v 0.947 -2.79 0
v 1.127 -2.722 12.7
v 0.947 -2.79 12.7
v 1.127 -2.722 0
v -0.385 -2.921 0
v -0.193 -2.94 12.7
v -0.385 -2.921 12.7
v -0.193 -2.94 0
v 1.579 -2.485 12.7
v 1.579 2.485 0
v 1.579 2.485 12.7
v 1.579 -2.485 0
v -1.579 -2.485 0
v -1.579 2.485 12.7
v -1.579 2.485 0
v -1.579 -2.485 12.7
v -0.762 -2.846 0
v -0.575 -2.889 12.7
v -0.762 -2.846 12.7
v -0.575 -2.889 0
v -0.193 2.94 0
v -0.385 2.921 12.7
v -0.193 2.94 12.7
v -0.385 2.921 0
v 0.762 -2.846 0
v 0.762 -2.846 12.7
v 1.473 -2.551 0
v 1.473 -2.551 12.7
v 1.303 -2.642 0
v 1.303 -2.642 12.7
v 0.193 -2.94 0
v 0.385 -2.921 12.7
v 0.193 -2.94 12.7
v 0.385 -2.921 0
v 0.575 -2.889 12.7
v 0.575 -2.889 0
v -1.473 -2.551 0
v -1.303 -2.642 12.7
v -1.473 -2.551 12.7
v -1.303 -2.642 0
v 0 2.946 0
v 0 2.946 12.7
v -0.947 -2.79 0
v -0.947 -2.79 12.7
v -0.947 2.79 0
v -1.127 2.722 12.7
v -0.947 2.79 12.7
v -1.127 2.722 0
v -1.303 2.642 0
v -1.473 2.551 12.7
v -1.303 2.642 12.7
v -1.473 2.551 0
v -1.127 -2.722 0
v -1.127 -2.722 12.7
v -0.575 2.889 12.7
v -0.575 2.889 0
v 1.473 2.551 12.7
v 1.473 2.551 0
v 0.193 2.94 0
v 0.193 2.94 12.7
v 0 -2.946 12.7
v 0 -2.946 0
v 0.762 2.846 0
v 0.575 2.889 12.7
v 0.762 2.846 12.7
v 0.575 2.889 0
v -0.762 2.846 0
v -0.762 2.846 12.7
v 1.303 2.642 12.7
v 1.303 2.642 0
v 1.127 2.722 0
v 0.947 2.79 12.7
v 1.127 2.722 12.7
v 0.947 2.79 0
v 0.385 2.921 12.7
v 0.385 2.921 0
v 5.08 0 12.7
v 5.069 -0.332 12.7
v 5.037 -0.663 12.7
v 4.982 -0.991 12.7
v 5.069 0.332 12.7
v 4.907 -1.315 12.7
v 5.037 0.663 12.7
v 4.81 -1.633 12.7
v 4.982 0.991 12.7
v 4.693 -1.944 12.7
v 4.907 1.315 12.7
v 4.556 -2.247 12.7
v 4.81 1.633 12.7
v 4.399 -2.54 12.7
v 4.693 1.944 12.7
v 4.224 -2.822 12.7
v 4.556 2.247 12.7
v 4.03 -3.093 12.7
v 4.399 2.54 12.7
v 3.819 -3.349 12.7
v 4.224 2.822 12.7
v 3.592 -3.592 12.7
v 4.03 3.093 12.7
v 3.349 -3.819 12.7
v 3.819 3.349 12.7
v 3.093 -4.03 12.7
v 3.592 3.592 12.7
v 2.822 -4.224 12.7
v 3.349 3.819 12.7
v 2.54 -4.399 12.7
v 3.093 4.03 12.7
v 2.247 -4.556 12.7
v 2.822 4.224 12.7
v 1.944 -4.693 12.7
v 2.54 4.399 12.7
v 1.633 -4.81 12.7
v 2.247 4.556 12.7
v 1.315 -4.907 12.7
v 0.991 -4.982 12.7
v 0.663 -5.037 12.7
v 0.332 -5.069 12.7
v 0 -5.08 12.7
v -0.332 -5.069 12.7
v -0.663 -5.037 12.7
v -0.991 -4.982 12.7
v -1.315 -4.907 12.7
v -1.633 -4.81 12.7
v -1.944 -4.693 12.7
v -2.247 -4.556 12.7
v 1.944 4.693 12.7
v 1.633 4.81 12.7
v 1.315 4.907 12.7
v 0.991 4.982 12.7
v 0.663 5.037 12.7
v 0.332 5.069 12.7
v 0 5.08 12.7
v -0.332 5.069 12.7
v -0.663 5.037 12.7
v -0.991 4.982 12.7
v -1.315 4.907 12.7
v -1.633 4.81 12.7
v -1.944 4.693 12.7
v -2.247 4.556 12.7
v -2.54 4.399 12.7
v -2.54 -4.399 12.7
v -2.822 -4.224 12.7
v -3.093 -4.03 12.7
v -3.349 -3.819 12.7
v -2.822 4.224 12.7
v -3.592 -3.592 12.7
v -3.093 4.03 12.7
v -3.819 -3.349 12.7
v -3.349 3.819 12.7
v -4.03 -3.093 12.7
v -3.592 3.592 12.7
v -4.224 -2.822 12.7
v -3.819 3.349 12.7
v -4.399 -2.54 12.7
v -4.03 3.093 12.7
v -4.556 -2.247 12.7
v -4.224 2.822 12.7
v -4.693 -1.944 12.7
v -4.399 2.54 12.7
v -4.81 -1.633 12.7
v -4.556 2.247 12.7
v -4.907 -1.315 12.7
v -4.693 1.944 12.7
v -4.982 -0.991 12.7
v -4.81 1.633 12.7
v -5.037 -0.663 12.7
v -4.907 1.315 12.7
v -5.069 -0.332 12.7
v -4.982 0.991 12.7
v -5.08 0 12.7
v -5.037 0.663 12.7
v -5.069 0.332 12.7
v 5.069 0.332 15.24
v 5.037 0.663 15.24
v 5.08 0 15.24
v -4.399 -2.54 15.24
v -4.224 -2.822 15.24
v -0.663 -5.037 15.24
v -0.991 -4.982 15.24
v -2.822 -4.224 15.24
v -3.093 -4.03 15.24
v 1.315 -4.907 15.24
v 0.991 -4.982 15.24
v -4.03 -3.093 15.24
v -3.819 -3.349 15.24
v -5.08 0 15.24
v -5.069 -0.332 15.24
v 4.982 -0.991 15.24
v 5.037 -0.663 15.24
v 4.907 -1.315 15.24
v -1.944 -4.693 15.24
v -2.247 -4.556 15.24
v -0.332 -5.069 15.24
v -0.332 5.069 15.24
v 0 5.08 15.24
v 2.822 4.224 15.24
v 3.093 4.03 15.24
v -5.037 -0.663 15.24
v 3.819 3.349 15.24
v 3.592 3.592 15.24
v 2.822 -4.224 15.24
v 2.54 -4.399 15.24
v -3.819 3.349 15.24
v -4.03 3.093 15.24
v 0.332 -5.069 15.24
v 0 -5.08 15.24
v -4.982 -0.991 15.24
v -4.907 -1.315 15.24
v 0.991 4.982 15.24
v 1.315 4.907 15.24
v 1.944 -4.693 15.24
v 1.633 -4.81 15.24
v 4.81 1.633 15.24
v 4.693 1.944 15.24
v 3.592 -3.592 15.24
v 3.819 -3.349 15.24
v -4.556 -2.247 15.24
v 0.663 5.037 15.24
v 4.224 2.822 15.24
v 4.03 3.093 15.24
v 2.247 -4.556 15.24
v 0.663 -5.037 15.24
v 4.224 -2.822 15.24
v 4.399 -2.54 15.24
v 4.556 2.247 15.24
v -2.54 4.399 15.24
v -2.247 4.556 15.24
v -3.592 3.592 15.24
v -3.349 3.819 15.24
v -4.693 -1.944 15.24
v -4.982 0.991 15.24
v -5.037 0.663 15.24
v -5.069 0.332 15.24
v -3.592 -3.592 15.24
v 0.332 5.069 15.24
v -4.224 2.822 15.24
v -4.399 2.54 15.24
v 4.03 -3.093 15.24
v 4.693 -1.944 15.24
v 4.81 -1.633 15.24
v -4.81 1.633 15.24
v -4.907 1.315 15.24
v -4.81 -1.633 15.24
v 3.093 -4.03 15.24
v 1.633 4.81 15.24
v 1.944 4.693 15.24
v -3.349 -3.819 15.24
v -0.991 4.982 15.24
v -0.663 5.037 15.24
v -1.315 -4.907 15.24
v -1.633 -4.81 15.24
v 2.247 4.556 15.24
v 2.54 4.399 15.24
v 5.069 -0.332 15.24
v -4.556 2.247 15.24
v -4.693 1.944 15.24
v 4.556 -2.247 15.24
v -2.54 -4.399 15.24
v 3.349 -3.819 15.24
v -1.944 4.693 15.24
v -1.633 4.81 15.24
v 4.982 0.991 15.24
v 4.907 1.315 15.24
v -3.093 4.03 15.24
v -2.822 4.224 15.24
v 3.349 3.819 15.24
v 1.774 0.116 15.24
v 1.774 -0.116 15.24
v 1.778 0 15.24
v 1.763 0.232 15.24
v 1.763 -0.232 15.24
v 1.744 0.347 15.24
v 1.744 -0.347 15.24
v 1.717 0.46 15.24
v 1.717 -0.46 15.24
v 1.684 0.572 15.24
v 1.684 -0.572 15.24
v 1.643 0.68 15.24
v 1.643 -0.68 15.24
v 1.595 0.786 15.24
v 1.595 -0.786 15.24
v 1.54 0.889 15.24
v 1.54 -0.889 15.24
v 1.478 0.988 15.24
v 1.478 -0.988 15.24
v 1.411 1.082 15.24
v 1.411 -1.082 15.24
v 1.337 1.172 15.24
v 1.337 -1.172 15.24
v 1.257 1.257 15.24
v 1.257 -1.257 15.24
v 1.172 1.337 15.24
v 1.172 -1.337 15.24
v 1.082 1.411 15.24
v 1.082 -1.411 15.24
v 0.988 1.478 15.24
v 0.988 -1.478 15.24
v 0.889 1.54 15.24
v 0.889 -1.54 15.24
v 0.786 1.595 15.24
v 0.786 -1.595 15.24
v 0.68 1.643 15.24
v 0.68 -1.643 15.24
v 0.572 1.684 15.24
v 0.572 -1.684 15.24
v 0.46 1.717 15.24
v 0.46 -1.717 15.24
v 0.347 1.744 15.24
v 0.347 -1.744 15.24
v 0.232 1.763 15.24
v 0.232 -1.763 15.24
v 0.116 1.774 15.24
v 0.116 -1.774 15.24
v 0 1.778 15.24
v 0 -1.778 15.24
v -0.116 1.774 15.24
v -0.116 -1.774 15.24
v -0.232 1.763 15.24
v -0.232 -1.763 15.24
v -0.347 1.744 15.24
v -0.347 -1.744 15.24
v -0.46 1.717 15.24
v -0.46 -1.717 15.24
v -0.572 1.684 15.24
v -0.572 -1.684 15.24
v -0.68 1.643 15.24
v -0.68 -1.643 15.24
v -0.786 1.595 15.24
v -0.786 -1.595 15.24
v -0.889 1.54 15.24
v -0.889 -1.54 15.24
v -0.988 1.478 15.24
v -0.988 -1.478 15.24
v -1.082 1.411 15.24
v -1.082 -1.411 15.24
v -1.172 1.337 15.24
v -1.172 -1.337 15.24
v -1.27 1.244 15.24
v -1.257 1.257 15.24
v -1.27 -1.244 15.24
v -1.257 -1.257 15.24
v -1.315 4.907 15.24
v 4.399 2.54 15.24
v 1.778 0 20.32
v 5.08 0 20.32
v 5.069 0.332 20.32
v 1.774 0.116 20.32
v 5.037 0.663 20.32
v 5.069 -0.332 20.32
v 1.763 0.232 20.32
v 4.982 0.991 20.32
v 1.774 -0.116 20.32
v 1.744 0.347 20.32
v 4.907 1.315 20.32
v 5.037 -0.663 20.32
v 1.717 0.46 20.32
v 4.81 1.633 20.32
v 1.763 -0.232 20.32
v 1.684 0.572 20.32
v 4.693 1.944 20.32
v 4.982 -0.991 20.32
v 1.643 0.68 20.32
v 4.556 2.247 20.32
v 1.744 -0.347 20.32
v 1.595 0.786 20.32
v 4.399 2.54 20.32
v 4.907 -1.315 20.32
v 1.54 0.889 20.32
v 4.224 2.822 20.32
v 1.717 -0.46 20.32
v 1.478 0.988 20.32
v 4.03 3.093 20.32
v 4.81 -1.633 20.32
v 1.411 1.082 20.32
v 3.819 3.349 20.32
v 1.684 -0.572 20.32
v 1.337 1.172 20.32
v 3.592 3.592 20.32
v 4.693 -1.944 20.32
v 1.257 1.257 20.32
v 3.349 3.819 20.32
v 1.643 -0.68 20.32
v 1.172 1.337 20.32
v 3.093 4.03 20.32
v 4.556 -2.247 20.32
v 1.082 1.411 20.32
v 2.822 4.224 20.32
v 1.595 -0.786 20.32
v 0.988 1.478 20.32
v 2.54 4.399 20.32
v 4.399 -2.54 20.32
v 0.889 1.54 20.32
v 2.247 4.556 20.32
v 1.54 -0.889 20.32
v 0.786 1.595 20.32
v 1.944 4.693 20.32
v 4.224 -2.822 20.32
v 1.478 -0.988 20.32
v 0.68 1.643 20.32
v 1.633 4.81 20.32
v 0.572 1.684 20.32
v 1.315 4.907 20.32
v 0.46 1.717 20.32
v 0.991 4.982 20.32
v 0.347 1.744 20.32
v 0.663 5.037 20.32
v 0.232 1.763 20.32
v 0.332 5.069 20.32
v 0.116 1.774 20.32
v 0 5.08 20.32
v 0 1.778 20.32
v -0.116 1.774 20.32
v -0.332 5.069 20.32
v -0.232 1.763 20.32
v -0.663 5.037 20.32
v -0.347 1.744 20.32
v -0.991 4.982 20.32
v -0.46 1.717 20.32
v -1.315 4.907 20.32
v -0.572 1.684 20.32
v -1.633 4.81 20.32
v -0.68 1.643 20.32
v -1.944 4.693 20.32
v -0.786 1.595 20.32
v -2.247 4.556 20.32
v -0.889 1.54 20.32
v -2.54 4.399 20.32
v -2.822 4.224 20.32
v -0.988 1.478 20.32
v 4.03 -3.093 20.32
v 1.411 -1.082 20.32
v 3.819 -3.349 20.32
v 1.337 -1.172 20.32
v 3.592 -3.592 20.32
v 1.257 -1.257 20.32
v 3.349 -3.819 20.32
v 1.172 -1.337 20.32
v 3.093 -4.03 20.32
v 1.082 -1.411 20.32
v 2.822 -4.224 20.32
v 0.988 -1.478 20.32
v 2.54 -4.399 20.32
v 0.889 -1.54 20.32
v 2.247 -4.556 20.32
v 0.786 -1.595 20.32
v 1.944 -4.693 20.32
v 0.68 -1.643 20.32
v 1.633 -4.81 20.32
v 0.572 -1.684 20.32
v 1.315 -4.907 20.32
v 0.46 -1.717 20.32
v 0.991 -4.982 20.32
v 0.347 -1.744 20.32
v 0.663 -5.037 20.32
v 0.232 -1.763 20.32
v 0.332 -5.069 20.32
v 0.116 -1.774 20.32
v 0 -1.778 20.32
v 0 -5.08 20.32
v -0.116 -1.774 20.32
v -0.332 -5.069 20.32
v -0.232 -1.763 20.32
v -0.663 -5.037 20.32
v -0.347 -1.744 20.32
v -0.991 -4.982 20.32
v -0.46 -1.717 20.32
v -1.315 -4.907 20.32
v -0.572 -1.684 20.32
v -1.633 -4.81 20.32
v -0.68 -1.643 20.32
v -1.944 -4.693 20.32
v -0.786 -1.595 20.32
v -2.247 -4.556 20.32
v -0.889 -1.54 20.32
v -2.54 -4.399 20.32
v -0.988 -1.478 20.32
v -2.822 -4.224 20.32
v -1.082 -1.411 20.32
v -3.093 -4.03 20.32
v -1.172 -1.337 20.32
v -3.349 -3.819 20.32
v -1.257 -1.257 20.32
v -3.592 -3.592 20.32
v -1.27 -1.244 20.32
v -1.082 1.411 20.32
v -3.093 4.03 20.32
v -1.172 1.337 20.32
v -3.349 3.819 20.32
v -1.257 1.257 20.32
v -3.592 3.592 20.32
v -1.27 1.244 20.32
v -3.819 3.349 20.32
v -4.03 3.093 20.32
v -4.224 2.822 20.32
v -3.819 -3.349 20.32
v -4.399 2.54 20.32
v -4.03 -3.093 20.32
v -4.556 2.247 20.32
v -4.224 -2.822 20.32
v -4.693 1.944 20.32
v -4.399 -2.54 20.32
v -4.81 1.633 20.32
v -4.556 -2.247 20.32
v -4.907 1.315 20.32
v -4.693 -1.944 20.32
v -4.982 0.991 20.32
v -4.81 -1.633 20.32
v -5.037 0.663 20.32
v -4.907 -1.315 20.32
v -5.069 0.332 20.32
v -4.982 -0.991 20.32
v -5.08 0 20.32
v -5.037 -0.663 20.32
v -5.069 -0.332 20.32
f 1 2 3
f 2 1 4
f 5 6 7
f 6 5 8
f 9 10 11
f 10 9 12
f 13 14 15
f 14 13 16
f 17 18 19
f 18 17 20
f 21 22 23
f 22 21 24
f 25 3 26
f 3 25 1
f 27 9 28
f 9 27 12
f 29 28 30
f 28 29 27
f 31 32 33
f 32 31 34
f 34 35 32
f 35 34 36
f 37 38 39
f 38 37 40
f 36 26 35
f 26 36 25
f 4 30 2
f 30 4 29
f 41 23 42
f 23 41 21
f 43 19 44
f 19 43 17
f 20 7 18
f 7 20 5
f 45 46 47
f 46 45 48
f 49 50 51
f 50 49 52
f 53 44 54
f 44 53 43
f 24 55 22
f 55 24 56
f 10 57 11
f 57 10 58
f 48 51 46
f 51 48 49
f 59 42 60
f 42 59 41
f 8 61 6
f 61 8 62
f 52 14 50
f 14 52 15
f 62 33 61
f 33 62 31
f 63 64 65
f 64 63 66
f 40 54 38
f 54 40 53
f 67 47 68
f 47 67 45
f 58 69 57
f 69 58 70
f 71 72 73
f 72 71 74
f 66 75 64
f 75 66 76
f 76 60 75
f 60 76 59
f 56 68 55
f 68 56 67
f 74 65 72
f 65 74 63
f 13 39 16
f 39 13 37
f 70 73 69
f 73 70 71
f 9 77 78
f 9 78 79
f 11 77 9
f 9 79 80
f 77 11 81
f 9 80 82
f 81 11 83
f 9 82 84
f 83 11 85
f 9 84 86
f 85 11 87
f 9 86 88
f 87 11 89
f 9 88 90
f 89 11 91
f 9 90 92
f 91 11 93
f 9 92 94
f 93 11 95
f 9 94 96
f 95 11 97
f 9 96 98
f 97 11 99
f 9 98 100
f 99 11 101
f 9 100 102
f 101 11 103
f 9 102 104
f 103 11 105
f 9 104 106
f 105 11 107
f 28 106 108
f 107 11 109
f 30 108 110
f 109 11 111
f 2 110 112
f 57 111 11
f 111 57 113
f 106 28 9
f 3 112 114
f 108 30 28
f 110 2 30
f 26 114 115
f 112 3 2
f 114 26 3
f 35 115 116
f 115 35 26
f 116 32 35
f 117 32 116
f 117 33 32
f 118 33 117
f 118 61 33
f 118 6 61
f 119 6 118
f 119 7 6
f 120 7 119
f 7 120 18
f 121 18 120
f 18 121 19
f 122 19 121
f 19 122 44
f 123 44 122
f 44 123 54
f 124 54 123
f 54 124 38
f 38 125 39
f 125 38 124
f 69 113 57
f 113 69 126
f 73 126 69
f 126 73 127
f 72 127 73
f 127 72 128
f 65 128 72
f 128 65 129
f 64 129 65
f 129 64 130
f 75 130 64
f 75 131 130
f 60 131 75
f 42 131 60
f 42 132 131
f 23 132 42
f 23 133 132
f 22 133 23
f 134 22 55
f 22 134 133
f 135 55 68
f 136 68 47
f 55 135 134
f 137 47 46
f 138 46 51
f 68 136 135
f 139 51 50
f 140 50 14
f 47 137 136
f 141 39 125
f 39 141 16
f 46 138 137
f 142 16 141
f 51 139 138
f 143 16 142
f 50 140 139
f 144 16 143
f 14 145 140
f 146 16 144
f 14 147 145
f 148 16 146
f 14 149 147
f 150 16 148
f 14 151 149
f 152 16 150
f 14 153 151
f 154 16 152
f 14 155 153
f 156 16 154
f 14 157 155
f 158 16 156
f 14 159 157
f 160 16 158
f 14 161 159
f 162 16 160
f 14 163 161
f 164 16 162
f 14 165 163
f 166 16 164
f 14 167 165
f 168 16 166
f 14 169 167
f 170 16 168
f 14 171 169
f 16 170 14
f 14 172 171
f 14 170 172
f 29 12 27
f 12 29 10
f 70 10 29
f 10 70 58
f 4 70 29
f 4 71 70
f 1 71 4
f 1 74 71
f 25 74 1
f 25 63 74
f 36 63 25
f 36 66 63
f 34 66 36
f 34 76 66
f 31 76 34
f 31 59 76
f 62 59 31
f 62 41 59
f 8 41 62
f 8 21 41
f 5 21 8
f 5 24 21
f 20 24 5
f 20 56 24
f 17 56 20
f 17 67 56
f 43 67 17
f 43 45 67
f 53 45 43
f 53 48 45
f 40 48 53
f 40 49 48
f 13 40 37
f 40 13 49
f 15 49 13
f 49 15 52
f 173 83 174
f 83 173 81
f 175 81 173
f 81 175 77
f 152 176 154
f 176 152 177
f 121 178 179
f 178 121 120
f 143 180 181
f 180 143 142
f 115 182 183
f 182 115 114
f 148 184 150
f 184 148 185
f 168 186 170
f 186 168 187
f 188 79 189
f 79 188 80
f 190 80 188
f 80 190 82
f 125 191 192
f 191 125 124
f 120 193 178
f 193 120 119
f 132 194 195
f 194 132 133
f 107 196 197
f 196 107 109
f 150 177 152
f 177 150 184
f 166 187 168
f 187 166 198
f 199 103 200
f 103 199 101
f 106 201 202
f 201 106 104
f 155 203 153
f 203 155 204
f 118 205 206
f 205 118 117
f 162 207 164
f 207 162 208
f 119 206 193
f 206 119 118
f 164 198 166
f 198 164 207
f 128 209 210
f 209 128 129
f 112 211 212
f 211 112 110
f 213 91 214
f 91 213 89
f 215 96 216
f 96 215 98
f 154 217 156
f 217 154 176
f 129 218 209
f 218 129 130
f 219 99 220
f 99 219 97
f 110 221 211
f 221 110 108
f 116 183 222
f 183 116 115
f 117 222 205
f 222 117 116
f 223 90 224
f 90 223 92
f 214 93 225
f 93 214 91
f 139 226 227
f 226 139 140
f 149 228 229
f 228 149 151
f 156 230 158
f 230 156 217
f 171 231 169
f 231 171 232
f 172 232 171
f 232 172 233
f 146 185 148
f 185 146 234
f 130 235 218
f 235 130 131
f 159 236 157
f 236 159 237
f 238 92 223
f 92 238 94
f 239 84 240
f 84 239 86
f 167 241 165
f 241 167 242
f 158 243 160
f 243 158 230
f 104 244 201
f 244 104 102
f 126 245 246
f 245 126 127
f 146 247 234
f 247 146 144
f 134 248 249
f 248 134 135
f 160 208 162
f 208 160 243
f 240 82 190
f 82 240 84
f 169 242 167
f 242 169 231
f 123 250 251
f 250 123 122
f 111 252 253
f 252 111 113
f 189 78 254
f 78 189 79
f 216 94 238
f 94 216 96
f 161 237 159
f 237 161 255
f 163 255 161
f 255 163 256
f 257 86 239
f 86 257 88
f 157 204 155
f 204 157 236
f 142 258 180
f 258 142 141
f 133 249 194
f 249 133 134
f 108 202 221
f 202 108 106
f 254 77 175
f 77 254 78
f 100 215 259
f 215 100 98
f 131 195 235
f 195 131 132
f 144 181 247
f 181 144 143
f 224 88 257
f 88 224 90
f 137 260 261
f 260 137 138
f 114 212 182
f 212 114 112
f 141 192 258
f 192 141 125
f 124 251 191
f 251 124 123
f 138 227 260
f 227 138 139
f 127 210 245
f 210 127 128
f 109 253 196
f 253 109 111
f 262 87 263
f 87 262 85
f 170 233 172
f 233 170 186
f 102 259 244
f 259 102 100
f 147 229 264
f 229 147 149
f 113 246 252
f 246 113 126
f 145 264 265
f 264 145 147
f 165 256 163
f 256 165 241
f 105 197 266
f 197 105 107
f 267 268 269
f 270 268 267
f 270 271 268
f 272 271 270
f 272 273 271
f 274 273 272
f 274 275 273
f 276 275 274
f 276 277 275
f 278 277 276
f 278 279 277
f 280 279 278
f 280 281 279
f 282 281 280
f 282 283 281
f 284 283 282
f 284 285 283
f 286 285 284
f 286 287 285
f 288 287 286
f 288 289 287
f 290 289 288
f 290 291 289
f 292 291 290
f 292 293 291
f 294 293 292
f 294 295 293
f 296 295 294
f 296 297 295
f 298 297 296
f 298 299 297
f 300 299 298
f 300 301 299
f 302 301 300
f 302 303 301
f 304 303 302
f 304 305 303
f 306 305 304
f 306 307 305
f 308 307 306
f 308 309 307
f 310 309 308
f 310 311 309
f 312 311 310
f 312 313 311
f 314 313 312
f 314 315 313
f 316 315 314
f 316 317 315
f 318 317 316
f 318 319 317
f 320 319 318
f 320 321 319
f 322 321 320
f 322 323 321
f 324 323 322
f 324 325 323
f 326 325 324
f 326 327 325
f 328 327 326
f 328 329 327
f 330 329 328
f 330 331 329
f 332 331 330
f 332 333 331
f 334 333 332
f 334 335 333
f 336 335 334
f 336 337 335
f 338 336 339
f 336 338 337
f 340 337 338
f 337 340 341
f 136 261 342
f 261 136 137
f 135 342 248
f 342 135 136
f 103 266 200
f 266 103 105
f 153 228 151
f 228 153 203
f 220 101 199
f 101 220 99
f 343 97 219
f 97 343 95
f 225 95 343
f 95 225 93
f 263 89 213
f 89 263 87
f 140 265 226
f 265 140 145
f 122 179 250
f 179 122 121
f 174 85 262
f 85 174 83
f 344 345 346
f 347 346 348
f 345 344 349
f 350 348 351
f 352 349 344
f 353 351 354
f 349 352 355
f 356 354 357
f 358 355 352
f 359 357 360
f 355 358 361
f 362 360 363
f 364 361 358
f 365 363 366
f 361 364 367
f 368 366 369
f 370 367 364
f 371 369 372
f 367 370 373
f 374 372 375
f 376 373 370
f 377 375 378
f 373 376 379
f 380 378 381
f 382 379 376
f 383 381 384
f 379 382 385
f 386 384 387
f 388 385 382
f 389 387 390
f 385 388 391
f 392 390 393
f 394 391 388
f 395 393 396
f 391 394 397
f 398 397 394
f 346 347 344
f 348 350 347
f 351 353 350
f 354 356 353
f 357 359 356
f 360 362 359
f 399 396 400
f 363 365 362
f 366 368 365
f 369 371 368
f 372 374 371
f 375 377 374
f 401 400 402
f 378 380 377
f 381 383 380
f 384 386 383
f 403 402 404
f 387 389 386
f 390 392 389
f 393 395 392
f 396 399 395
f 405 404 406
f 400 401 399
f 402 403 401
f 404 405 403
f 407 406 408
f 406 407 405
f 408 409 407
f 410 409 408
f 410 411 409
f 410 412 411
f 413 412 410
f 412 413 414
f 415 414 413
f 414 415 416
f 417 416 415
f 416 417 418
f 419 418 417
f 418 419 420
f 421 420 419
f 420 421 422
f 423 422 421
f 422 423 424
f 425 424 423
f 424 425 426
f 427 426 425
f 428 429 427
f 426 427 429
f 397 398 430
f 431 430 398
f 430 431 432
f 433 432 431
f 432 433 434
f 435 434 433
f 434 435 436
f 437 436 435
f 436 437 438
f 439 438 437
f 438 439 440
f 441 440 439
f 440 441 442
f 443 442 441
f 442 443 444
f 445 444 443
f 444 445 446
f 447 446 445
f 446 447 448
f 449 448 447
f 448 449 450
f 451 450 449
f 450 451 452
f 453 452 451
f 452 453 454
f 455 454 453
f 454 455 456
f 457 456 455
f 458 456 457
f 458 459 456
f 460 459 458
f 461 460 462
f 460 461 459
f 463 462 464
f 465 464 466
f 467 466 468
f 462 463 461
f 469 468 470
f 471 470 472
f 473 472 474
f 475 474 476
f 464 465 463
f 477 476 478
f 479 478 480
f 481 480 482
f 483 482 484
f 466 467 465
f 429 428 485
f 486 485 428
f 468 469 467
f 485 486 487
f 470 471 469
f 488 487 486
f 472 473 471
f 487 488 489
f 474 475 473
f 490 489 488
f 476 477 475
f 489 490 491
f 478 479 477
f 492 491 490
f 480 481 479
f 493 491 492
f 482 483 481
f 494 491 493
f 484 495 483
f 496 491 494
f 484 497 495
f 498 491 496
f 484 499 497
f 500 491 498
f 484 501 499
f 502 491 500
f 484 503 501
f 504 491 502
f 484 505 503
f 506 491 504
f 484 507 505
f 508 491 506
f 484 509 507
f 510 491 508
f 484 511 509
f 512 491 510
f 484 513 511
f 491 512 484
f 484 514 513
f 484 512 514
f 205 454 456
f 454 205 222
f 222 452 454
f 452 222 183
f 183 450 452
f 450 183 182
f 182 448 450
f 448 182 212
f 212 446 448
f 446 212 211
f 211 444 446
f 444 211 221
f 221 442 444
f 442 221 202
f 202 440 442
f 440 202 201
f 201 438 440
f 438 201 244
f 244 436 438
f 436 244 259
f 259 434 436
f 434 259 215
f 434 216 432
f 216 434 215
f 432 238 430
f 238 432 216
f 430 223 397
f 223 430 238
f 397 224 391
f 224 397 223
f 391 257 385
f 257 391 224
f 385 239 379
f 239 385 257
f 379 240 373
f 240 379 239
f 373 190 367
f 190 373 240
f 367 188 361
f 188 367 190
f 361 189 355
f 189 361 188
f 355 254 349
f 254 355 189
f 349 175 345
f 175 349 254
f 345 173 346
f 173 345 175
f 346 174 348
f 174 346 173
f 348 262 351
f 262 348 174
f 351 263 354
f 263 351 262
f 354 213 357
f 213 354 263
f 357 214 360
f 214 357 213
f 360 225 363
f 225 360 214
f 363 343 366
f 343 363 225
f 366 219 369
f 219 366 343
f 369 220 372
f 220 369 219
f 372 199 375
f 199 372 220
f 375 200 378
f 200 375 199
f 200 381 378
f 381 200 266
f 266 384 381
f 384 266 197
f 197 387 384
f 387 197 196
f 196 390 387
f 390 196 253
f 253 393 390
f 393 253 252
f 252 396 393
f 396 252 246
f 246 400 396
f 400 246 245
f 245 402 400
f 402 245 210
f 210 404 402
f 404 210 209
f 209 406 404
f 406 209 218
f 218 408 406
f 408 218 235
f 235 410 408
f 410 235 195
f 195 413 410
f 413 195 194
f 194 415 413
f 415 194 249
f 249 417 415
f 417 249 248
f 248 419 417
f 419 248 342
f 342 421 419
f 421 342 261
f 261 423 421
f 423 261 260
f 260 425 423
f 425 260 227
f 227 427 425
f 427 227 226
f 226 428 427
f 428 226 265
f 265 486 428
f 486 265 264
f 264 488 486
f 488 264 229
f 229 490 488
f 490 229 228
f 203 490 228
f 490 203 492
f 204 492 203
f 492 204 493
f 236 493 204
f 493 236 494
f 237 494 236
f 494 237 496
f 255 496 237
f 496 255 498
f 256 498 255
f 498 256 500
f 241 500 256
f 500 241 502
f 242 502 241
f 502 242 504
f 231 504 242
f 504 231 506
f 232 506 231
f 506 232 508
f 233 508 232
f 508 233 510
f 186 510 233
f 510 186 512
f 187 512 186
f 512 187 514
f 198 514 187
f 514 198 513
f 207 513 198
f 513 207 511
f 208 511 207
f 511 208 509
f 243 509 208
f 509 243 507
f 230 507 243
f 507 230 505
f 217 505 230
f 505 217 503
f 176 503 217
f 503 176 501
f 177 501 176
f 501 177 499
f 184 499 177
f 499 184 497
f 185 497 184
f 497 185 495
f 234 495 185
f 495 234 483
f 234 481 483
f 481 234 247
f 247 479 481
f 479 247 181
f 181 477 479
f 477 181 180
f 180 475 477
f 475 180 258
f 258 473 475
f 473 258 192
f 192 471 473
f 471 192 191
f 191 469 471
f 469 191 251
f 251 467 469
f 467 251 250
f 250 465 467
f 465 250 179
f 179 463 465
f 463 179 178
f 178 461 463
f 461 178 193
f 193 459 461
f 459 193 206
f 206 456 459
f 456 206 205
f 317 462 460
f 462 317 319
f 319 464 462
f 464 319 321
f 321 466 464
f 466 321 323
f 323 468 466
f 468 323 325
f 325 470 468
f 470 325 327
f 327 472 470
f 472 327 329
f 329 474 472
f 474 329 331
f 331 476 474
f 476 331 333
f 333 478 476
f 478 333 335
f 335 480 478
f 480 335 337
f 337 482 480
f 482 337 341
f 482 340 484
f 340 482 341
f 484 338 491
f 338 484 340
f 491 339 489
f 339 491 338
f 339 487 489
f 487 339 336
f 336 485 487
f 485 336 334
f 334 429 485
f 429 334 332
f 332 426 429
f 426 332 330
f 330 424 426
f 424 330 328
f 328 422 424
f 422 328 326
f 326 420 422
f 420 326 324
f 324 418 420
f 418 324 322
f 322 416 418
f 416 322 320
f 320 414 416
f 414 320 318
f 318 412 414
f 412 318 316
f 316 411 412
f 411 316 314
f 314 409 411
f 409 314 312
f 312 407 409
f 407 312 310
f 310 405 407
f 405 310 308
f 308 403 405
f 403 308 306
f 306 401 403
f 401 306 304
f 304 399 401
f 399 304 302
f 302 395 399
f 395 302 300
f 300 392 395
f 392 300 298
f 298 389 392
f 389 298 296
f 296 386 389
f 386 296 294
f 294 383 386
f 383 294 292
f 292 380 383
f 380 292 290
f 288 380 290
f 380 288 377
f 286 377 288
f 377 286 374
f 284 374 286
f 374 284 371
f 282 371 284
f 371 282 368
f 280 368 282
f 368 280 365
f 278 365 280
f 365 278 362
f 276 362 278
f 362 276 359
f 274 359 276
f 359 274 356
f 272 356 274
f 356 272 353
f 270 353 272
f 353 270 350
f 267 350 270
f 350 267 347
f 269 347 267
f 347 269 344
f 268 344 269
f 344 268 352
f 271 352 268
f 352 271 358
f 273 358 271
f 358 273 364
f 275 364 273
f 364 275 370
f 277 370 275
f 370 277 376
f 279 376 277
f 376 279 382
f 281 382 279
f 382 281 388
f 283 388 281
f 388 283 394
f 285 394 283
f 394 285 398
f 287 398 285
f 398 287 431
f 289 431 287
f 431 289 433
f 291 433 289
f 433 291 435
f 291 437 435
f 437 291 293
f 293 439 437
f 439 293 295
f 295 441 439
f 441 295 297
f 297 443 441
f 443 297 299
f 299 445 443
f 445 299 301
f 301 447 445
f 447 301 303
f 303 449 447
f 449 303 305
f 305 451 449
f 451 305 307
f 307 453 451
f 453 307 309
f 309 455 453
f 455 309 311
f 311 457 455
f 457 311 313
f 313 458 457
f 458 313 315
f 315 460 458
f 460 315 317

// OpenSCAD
ViewScale = [0.0254, 0.0254, 0.0254];

dsunhole = 6.4/25.4*1000;
cutoff = dsunhole/sqrt(2);

module gearMotorInsert()
{
    difference() {
        circle(200, $fn=96);
        intersection() {
            circle(70, $fn=96);
            translate([20, 0, 0])
            square([140, 200], center=true);
        }
    }
}
module gearsetShaft()
{
    difference() {
    circle(dsunhole/2-10, $fn=96);
    translate([cutoff+10, 0, 0])
    square(dsunhole, dsunhole, center = true);
    rotate([0, 0, 180])
    translate([cutoff+10, 0, 0])
    square(dsunhole, dsunhole, center = true);
    }

}

scale(ViewScale)
{
    linear_extrude(500)
    gearsetShaft();

    translate([0, 0, 500])
    linear_extrude(100)
    circle(200, $fn=96);


    translate([0, 0, 600])
    linear_extrude(200)
    gearMotorInsert();
}
